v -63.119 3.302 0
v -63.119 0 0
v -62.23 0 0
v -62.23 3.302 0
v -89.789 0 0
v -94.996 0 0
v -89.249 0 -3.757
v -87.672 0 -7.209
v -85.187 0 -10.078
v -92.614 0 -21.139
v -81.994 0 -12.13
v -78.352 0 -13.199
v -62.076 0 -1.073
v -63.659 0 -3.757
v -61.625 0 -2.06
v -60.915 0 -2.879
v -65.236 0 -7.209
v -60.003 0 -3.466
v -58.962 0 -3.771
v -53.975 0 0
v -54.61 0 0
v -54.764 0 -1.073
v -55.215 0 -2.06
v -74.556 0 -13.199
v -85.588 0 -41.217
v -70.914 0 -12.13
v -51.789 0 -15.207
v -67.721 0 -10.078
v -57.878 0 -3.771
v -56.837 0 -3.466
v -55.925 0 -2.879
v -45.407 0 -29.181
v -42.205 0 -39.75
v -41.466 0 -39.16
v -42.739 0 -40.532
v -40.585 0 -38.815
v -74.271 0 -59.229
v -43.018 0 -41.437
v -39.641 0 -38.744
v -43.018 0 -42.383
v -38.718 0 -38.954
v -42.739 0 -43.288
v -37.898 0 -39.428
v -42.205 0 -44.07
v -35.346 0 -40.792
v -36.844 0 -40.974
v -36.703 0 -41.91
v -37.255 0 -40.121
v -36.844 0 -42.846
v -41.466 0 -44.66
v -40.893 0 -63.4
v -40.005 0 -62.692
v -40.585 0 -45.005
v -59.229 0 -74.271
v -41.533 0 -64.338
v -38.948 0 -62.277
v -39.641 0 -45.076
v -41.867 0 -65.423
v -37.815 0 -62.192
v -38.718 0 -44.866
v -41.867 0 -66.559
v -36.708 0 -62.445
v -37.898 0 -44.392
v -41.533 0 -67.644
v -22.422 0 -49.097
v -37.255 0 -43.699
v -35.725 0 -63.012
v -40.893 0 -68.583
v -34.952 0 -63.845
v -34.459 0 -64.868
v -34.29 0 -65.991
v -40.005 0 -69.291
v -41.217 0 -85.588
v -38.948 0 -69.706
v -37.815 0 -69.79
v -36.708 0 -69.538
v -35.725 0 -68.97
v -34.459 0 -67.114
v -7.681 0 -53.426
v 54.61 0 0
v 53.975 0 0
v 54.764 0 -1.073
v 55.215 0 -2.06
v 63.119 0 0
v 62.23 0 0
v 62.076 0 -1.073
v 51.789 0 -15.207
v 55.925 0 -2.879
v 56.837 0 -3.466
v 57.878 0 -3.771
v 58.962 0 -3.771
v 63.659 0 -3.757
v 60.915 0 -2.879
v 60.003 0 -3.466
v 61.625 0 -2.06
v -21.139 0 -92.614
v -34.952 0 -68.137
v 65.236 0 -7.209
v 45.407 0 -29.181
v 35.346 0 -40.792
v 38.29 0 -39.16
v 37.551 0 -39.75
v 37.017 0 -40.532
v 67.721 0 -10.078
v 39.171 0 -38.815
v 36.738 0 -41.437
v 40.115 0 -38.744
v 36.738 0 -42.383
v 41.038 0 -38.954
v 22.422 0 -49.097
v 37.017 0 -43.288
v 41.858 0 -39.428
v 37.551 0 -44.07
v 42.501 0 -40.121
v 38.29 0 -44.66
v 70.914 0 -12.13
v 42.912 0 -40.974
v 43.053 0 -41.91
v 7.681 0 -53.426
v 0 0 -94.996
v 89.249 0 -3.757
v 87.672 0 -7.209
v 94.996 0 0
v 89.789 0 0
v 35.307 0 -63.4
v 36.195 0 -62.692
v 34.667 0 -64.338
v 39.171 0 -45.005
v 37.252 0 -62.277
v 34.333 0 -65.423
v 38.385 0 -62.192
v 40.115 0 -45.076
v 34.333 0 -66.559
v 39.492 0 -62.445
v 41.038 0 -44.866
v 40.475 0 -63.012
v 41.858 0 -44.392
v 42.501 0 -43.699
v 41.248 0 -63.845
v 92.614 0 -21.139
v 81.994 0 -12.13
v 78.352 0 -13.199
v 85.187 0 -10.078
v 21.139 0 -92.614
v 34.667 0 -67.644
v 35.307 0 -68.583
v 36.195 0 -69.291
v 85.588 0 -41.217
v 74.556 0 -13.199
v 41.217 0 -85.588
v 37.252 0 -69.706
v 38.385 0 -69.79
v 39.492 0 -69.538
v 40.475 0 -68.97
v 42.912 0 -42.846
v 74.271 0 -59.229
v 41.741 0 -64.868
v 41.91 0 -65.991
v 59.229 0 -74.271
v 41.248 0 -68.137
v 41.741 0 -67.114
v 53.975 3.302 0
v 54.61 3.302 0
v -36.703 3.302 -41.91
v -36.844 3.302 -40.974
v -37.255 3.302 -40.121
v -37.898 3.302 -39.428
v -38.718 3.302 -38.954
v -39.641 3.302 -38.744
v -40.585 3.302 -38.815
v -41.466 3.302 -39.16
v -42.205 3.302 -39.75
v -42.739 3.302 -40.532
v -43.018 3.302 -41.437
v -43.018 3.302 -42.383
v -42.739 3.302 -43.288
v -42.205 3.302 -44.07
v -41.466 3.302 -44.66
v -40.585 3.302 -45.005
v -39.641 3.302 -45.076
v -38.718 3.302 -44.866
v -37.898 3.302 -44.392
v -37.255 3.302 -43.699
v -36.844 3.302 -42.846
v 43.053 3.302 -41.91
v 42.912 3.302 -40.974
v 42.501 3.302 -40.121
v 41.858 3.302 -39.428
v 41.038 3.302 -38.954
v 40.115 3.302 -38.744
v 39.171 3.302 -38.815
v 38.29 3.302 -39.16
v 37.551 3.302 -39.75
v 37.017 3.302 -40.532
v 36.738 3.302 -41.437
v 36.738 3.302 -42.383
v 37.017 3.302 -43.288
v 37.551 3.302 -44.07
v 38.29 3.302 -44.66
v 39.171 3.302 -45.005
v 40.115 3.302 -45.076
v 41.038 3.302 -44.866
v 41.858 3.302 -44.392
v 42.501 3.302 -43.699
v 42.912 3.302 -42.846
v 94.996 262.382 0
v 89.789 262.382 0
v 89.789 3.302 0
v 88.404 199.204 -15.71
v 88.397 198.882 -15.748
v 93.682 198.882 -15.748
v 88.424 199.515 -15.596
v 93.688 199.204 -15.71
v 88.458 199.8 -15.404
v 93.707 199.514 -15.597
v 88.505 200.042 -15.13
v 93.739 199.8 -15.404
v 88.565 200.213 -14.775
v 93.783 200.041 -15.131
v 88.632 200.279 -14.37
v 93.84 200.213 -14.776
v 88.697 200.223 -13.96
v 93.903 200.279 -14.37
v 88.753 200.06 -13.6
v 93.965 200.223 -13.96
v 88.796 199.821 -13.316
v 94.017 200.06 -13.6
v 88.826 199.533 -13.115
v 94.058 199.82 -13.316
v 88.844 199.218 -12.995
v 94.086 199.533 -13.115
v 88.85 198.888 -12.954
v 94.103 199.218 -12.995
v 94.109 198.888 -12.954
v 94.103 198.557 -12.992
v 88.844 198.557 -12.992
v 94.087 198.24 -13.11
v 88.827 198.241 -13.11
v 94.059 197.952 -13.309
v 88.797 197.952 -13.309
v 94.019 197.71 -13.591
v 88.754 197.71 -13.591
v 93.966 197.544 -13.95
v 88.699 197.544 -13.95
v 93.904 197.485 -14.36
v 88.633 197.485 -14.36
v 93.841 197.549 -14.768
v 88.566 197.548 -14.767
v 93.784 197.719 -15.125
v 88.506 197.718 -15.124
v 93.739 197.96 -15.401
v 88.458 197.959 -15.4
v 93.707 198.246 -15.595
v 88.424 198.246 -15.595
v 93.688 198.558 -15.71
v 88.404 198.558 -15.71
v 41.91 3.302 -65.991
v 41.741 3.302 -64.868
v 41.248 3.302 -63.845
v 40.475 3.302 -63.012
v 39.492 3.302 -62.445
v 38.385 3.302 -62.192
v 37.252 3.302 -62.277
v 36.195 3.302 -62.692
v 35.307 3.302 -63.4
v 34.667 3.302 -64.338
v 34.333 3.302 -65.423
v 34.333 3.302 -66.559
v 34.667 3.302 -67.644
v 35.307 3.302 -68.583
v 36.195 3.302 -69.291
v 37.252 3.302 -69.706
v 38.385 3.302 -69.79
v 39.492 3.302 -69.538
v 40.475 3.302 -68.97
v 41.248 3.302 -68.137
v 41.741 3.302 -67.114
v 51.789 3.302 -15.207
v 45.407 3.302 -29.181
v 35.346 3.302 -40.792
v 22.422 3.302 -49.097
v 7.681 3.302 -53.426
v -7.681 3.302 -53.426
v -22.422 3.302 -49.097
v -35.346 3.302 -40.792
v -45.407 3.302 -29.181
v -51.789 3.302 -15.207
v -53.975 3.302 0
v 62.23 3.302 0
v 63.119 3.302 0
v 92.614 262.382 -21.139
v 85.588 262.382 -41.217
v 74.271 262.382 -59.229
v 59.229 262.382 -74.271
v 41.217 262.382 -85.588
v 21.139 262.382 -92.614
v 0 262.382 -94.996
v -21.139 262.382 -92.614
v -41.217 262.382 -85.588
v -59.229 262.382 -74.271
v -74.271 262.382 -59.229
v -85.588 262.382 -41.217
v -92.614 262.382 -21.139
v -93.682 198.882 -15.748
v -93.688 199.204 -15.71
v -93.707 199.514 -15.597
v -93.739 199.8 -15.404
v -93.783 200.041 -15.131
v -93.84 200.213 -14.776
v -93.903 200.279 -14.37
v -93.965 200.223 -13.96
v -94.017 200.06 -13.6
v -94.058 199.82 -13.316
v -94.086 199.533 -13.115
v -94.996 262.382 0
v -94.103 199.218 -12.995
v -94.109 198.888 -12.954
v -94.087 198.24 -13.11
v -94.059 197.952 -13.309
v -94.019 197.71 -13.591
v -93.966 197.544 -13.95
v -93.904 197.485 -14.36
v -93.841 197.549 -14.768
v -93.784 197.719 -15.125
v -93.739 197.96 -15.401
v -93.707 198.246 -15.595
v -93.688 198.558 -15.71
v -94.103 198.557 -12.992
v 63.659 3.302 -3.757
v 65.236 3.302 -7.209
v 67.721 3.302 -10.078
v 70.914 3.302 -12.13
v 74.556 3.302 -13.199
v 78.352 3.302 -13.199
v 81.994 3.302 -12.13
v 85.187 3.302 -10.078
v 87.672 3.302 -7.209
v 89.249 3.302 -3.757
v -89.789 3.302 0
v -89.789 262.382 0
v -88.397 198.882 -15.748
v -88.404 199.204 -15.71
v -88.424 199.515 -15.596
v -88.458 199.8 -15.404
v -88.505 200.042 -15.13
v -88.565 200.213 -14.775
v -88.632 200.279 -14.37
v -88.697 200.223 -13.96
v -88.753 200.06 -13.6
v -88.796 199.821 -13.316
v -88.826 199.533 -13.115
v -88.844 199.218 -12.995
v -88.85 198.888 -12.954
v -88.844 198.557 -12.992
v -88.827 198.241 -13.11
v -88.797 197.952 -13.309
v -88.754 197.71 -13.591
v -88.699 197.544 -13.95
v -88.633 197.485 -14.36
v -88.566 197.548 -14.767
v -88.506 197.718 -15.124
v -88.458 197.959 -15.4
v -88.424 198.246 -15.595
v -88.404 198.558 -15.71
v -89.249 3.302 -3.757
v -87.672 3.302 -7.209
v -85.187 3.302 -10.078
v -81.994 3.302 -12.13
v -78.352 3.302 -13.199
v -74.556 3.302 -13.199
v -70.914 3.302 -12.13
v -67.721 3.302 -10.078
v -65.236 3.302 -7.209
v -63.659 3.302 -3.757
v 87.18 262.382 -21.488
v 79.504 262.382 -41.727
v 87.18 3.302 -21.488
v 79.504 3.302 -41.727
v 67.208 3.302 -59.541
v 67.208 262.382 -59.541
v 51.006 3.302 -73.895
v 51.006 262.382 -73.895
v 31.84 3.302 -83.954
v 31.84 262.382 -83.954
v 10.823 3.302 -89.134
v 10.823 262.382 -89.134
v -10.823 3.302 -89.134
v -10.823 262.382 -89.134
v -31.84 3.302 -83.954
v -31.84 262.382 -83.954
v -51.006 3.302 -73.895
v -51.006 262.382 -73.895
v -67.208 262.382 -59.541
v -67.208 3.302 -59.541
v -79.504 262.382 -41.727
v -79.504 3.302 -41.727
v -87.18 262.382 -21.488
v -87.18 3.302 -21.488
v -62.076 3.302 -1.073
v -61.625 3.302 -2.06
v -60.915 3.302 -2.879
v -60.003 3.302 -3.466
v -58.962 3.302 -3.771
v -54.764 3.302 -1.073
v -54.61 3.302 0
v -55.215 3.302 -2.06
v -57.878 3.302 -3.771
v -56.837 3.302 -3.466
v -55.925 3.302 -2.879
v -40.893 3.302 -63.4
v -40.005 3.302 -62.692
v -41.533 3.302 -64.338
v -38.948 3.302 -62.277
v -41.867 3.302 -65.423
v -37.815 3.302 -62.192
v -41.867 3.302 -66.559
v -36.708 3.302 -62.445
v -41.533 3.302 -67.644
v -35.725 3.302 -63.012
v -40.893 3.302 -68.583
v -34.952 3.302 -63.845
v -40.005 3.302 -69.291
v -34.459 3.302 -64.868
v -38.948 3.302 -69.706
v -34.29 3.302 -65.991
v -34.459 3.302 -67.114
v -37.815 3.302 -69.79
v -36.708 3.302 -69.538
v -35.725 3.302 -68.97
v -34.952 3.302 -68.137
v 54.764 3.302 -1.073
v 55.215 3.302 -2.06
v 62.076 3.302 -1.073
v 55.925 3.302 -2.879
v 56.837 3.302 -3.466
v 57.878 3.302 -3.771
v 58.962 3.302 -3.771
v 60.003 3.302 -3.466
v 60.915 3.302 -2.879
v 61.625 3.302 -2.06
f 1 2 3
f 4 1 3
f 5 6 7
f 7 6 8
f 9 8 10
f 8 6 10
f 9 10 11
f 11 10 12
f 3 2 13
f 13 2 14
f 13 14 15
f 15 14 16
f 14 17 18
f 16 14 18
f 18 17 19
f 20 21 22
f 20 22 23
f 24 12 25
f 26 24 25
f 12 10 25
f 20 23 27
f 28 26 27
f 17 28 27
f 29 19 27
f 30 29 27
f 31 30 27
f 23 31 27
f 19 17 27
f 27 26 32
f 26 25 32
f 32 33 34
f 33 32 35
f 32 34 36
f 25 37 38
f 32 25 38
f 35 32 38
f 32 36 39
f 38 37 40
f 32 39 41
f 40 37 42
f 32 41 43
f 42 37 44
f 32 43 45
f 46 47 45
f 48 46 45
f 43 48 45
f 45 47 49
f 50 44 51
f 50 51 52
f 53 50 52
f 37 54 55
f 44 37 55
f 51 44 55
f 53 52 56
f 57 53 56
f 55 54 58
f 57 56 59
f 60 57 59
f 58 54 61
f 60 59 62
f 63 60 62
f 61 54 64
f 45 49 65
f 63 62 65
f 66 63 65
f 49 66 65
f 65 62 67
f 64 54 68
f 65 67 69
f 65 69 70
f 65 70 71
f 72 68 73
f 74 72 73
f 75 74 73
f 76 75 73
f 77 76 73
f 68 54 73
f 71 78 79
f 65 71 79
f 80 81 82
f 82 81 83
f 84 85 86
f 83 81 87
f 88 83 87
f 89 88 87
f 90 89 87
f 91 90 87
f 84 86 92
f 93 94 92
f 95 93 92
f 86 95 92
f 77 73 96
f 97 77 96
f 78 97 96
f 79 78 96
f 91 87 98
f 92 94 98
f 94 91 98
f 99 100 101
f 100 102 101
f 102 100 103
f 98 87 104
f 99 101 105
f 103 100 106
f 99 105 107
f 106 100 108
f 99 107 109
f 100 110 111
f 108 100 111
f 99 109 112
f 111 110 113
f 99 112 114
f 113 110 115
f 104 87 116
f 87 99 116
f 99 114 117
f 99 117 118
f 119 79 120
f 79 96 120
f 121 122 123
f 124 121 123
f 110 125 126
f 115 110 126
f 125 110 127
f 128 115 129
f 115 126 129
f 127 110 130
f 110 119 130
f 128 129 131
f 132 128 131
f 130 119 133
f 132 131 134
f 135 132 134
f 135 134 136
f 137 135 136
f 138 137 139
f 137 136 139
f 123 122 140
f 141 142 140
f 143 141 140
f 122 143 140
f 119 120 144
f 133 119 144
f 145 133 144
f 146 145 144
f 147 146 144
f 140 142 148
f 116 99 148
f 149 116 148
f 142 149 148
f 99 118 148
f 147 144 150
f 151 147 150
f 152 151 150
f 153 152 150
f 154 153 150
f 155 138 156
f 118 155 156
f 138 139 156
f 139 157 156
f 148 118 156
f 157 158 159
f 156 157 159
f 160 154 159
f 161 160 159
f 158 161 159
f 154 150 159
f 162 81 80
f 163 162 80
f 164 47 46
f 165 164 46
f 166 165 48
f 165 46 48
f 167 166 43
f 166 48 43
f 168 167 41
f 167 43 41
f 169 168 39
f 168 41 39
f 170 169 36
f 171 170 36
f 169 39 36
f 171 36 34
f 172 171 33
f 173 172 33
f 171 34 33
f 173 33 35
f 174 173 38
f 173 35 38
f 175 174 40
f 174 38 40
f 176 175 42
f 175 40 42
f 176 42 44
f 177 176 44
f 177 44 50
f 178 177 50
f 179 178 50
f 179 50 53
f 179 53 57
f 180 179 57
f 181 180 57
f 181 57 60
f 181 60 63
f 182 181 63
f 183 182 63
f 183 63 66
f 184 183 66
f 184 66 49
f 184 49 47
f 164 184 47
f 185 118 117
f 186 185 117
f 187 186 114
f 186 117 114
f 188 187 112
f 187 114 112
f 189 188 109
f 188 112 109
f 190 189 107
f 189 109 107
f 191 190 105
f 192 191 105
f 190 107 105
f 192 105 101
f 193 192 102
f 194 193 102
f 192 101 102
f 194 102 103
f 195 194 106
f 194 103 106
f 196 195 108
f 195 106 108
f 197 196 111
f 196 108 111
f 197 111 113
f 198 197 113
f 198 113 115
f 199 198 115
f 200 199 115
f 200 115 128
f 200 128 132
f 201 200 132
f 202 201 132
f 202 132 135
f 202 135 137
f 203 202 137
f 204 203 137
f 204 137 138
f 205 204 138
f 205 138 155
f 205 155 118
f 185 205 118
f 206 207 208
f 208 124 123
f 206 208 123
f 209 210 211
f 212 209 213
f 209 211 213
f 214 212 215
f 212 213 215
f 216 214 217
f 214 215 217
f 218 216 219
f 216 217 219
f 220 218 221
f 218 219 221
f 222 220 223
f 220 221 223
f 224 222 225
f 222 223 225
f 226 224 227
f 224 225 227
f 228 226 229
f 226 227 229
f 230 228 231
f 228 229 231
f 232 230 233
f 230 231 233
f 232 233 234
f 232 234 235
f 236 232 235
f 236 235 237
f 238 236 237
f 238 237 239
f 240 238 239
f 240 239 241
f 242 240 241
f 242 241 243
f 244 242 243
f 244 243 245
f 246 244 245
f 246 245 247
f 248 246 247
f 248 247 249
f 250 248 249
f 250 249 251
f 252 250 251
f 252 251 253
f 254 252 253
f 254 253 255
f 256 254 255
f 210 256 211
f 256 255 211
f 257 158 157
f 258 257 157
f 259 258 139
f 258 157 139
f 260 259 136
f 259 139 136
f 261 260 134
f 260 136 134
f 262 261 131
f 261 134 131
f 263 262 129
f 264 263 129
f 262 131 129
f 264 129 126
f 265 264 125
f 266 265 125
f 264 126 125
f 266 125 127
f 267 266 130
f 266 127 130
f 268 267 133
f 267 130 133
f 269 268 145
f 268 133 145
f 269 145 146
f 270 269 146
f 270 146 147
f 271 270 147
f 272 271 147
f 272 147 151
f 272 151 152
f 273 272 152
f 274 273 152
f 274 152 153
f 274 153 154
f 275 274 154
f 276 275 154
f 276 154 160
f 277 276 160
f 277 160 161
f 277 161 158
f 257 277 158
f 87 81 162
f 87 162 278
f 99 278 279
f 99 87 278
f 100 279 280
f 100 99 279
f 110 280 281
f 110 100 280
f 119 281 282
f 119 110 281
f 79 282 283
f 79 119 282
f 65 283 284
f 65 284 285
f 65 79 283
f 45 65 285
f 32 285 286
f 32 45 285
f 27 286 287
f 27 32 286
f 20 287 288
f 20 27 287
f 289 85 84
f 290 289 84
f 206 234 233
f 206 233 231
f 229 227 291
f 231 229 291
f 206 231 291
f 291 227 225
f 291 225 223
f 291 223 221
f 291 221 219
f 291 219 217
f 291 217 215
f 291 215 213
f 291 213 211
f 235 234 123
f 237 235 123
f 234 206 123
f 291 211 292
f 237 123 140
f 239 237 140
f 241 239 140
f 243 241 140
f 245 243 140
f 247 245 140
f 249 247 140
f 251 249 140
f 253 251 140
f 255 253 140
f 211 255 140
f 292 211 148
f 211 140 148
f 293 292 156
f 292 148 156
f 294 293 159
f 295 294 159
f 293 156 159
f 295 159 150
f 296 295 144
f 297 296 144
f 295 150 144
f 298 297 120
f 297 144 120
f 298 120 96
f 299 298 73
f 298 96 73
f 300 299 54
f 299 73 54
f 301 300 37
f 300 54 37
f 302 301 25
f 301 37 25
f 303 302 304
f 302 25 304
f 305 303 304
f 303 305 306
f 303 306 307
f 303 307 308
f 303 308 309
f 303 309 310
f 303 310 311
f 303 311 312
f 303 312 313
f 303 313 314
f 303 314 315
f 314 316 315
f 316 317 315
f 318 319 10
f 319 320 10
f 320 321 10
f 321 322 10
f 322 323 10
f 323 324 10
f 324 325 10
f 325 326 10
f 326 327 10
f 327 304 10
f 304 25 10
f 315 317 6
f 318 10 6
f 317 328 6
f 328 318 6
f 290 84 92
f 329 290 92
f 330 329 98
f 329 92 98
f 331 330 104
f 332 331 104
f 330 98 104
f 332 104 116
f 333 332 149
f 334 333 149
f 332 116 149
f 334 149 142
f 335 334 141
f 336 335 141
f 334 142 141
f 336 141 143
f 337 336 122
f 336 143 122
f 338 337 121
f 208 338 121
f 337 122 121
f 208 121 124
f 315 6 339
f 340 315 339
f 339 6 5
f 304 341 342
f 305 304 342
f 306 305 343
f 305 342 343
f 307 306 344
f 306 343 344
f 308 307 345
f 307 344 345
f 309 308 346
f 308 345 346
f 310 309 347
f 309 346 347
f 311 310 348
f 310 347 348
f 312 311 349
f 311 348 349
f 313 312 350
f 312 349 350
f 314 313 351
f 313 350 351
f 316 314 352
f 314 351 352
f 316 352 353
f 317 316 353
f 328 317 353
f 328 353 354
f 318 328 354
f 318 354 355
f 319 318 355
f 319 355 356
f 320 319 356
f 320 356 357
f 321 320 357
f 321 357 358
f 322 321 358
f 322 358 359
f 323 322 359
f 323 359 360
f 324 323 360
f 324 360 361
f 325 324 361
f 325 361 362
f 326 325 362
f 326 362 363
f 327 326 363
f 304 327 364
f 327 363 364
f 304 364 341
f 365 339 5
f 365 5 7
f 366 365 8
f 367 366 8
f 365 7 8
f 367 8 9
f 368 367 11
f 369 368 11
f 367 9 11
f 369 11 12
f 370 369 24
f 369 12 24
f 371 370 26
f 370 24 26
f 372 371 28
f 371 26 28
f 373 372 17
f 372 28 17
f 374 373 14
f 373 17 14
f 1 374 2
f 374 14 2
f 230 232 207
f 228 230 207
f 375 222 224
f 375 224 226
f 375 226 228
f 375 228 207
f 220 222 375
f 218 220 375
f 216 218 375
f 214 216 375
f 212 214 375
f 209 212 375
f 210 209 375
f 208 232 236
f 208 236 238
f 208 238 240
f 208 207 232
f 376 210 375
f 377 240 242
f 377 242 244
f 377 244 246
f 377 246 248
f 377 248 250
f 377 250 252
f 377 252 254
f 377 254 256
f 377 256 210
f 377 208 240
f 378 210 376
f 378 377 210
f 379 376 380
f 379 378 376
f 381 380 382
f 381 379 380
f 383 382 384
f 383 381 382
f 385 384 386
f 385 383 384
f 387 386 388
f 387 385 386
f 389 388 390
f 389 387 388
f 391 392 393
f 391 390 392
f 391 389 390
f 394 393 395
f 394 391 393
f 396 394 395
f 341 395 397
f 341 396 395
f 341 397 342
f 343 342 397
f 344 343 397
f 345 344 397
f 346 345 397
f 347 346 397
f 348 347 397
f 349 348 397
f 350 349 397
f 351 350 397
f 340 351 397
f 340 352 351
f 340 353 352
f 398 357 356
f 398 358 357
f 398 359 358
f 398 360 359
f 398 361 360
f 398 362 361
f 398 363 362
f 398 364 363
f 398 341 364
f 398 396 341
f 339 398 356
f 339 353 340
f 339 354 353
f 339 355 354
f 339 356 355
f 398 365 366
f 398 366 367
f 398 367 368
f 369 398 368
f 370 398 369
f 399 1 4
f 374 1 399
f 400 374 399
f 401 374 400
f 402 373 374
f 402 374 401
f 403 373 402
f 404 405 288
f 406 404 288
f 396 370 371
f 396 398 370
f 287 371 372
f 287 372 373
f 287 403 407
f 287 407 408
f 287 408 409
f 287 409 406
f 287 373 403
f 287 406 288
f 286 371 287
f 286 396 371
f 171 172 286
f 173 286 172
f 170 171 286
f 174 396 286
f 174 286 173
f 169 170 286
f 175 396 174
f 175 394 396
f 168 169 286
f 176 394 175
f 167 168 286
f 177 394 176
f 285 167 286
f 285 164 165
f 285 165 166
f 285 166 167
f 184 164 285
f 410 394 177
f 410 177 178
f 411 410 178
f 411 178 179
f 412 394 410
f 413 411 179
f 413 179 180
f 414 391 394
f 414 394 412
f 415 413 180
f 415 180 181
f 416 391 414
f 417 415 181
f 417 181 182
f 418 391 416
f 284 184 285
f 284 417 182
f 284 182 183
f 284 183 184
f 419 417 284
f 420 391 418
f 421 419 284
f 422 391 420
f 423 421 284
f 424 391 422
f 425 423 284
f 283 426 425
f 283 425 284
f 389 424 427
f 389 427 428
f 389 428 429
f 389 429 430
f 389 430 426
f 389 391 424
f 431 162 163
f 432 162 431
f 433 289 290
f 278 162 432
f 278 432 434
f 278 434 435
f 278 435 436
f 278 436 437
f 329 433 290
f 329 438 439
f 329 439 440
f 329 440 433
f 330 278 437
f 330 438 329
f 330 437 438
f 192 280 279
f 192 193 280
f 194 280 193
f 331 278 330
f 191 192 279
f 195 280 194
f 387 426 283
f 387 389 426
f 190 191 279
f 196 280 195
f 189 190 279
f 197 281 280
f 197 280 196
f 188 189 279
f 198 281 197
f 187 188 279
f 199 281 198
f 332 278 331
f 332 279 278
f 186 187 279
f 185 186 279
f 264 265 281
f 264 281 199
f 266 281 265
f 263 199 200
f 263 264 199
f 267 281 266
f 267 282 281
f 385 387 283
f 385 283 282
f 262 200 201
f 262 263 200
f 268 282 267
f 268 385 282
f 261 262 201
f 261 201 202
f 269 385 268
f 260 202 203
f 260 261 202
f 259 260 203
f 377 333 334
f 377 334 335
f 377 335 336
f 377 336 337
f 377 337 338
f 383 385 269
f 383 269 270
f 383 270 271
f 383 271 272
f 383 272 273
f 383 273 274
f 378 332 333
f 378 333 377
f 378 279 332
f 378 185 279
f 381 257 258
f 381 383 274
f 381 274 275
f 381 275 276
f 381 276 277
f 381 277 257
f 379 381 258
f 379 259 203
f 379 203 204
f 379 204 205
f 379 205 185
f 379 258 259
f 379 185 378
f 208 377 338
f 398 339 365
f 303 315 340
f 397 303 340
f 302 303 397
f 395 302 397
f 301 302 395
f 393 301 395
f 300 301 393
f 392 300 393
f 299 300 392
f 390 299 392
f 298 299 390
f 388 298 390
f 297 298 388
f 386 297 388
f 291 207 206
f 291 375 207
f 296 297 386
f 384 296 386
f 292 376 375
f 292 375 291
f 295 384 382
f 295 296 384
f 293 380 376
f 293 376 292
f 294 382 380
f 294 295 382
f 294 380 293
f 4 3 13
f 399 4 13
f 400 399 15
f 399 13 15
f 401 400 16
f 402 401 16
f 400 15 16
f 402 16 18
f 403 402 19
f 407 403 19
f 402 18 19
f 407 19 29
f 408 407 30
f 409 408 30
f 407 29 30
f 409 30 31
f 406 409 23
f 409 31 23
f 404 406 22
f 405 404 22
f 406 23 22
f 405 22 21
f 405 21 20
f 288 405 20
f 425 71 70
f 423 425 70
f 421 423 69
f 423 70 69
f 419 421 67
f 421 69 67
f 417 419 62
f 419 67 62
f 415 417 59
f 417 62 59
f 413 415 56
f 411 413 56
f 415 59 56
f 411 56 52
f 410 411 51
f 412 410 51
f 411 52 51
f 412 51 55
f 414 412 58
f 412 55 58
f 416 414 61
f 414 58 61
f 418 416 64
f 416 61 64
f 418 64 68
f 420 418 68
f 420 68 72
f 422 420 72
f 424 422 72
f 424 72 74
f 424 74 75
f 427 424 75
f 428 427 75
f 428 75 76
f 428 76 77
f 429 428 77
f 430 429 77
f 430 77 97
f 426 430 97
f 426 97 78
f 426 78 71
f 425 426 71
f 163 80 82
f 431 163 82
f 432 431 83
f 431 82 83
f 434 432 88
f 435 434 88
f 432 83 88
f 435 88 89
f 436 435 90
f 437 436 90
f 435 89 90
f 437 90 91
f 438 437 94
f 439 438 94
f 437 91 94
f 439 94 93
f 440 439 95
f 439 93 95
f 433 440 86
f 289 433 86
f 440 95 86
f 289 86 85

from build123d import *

# Parameters (mm, degrees)
SKETCH1_R               = 94.996
SKETCH1_R_2             = 53.975
TOP_OF_HATCH_DEPTH      = 3.302
SKETCH2_R               = 94.996
SKETCH2_R_2             = 89.789
HATCH_BODY_DEPTH        = 259.08
SKETCH3_R               = 13.335
CHARGE_TUBE_HOLES_DEPTH = 263.382
SKETCH4_R               = 3.81
BOLT_HOLES_DEPTH        = 263.382
SKETCH_5_R              = 5.08
ANTENNA_HOLES_DEPTH     = 263.382
SKETCH5_R               = 3.81
SKETCH5_R_2             = 3.175
INNER_SCREW_HOLES_DEPTH = 263.382
SKETCH8_R               = 1.397
CUT_EXTRUDE1_DEPTH      = 190.992
CUT_EXTRUDE3_DEPTH      = 263.3820001


with BuildPart() as part:
    # Sketch1 → Top of Hatch (new body)
    with BuildSketch(Plane(origin=(0, 0, 0), x_dir=(1, 0, 0), z_dir=(0, 1, 0))):
        Circle(SKETCH1_R)
        Circle(SKETCH1_R_2, mode=Mode.SUBTRACT)
    extrude(amount=TOP_OF_HATCH_DEPTH)

    # Sketch2 → Hatch Body (add)
    with BuildSketch(Plane(origin=(0, 3.302, 0), x_dir=(1, 0, 0), z_dir=(0, 1, 0))):
        Circle(SKETCH2_R)
        Circle(SKETCH2_R_2, mode=Mode.SUBTRACT)
    extrude(amount=HATCH_BODY_DEPTH)

    # Sketch3 → Charge Tube Holes (cut, through all)
    with BuildSketch(Plane.XZ):
        with Locations((-76.454, 0)):
            Circle(SKETCH3_R)
        with Locations((76.454, 0)):
            Circle(SKETCH3_R)
    extrude(amount=-CHARGE_TUBE_HOLES_DEPTH, mode=Mode.SUBTRACT)

    # Sketch4 → Bolt Holes (cut, through all)
    with BuildSketch(Plane.XZ):
        with Locations((-38.1, -65.991135768)):
            Circle(SKETCH4_R)
        with Locations((-38.1, 65.991135768)):
            Circle(SKETCH4_R)
        with Locations((38.1, 65.991135768)):
            Circle(SKETCH4_R)
        with Locations((38.1, -65.991135768)):
            Circle(SKETCH4_R)
    extrude(amount=-BOLT_HOLES_DEPTH, mode=Mode.SUBTRACT)

    # Sketch 5 → Antenna Holes (cut, through all)
    with BuildSketch(Plane.XZ):
        with Locations((-26.112352144, 57.324838678)):
            Circle(SKETCH_5_R)
        with Locations((9.193647856, 61.033450854)):
            Circle(SKETCH_5_R)
    extrude(amount=-ANTENNA_HOLES_DEPTH, mode=Mode.SUBTRACT)

    # Sketch5 → Inner Screw Holes (cut, through all)
    with BuildSketch(Plane.XZ):
        with Locations((58.42, 0)):
            Circle(SKETCH5_R)
        with Locations((-58.42, 0)):
            Circle(SKETCH5_R)
        with Locations((39.878, 41.91)):
            Circle(SKETCH5_R_2)
        with Locations((-39.878, 41.91)):
            Circle(SKETCH5_R_2)
        with Locations((39.878, -41.91)):
            Circle(SKETCH5_R_2)
        with Locations((-39.878, -41.91)):
            Circle(SKETCH5_R_2)
    extrude(amount=-INNER_SCREW_HOLES_DEPTH, mode=Mode.SUBTRACT)

    # Sketch8 → Cut-Extrude1 (cut, through all)
    with BuildSketch(Plane(origin=(94.996, 0, 0), x_dir=(0, 0, -1), z_dir=(1, 0, 0))):
        with Locations((14.351, 198.882)):
            Circle(SKETCH8_R)
        with Locations((-14.351, 198.882)):
            Circle(SKETCH8_R)
    extrude(amount=-CUT_EXTRUDE1_DEPTH, mode=Mode.SUBTRACT)

    # Sketch12 → Cut-Extrude3 (cut, through all)
    with BuildSketch(Plane.XZ):
        with BuildLine():
            Line((-94.996, 0), (94.996, 0))
            ThreePointArc((94.996, 0), (0, 94.996), (-94.996, 0))
        make_face()
    extrude(amount=-CUT_EXTRUDE3_DEPTH, mode=Mode.SUBTRACT)


solid = part.part
